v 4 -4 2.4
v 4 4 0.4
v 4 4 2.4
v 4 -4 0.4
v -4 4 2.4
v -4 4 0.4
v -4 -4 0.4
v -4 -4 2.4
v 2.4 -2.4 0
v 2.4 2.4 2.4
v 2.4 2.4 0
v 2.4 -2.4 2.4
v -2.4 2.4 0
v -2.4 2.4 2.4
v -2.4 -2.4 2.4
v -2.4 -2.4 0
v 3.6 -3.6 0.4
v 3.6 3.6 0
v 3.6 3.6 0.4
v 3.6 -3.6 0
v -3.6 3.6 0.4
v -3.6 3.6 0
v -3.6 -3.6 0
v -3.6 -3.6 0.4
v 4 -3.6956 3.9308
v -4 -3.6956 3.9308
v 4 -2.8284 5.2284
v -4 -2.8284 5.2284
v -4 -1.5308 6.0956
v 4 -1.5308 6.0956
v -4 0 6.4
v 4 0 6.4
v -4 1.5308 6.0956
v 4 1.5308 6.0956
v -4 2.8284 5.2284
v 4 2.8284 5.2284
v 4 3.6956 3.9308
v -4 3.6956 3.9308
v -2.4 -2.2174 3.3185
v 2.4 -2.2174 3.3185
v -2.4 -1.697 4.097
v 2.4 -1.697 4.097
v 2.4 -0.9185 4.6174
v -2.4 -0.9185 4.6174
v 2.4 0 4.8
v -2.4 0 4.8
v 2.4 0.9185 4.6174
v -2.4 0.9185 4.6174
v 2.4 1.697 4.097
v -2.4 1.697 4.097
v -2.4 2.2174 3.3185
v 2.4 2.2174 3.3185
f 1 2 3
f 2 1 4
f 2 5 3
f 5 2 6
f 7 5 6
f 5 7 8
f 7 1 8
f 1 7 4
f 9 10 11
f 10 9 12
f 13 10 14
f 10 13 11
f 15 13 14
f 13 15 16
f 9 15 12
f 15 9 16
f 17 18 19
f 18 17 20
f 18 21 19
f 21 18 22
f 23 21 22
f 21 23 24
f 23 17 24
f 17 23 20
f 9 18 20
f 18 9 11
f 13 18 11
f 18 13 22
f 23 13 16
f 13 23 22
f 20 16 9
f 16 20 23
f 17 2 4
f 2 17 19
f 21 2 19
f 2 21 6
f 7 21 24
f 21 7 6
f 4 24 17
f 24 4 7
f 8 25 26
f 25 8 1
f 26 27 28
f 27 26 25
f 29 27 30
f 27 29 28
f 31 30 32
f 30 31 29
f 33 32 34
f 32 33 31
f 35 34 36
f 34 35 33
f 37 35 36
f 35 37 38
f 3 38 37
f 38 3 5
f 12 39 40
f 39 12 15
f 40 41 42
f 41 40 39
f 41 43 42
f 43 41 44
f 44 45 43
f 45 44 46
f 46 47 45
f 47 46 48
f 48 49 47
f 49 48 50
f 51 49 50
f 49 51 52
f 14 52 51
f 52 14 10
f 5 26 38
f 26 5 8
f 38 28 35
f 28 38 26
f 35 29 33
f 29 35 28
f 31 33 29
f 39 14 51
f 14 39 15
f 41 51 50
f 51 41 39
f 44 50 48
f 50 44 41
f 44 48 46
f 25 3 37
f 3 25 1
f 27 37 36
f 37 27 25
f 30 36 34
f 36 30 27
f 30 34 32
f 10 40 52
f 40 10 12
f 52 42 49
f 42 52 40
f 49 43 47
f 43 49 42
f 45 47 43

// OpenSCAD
// file: ../p/2-4edge.scad
use <../lib.scad>
function ldraw_lib__2_4edge() = [
// 0 Circle 0.5
// 0 Name: 2-4edge.dat
// 0 Author: James Jessiman
// 0 !LDRAW_ORG Primitive UPDATE 2017-01
// 0 !LICENSE Licensed under CC BY 2.0 and CC BY 4.0 : see CAreadme.txt
// 
// 0 BFC CERTIFY CCW
  [0,"BFC","CERTIFY"],
  [0,"BFC","CCW"],
// 
// 0 !HISTORY 2007-06-24 [PTadmin] Header formatted for Contributor Agreement
// 0 !HISTORY 2008-07-01 [PTadmin] Official Update 2008-01
// 0 !HISTORY 2017-01-15 [Steffen] BFCed
// 0 !HISTORY 2017-12-30 [PTadmin] Official Update 2017-01
// 
// 
// 2 24 1 0 0 0.9239 0 0.3827
  [2,24,1,0,0,0.9239,0,0.3827],
// 2 24 0.9239 0 0.3827 0.7071 0 0.7071
  [2,24,0.9239,0,0.3827,0.7071,0,0.7071],
// 2 24 0.7071 0 0.7071 0.3827 0 0.9239
  [2,24,0.7071,0,0.7071,0.3827,0,0.9239],
// 2 24 0.3827 0 0.9239 0 0 1
  [2,24,0.3827,0,0.9239,0,0,1],
// 2 24 0 0 1 -0.3827 0 0.9239
  [2,24,0,0,1,-0.3827,0,0.9239],
// 2 24 -0.3827 0 0.9239 -0.7071 0 0.7071
  [2,24,-0.3827,0,0.9239,-0.7071,0,0.7071],
// 2 24 -0.7071 0 0.7071 -0.9239 0 0.3827
  [2,24,-0.7071,0,0.7071,-0.9239,0,0.3827],
// 2 24 -0.9239 0 0.3827 -1 0 0
  [2,24,-0.9239,0,0.3827,-1,0,0],
];
makepoly(ldraw_lib__2_4edge(), line=0.2);
// file: ../p/2-4cyli.scad
use <../lib.scad>
function ldraw_lib__2_4cyli() = [
// 0 Cylinder 0.5
// 0 Name: 2-4cyli.dat
// 0 Author: James Jessiman
// 0 !LDRAW_ORG Primitive UPDATE 2005-01
// 0 !LICENSE Licensed under CC BY 2.0 and CC BY 4.0 : see CAreadme.txt
// 
// 0 BFC CERTIFY CCW
  [0,"BFC","CERTIFY"],
  [0,"BFC","CCW"],
// 
// 0 !HISTORY 2002-03-23 [sbliss] Added BFC statement; compacted code
// 0 !HISTORY 2002-04-25 [PTadmin] Official Update 2002-02
// 0 !HISTORY 2004-12-11 [nielsk] Recreated using Primitive Generator, Edge lines fixed, BFC changed to CCW
// 0 !HISTORY 2005-12-28 [PTadmin] Official Update 2005-01
// 0 !HISTORY 2007-06-24 [PTadmin] Header formatted for Contributor Agreement
// 0 !HISTORY 2008-07-01 [PTadmin] Official Update 2008-01
// 
// 
// 4 16 .9239 1 .3827 .9239 0 .3827 1 0 0 1 1 0
  [4,16,.9239,1,.3827,.9239,0,.3827,1,0,0,1,1,0],
// 4 16 .7071 1 .7071 .7071 0 .7071 .9239 0 .3827 .9239 1 .3827
  [4,16,.7071,1,.7071,.7071,0,.7071,.9239,0,.3827,.9239,1,.3827],
// 4 16 .3827 1 .9239 .3827 0 .9239 .7071 0 .7071 .7071 1 .7071
  [4,16,.3827,1,.9239,.3827,0,.9239,.7071,0,.7071,.7071,1,.7071],
// 4 16 0 1 1 0 0 1 .3827 0 .9239 .3827 1 .9239
  [4,16,0,1,1,0,0,1,.3827,0,.9239,.3827,1,.9239],
// 4 16 -.3827 1 .9239 -.3827 0 .9239 0 0 1 0 1 1
  [4,16,-.3827,1,.9239,-.3827,0,.9239,0,0,1,0,1,1],
// 4 16 -.7071 1 .7071 -.7071 0 .7071 -.3827 0 .9239 -.3827 1 .9239
  [4,16,-.7071,1,.7071,-.7071,0,.7071,-.3827,0,.9239,-.3827,1,.9239],
// 4 16 -.9239 1 .3827 -.9239 0 .3827 -.7071 0 .7071 -.7071 1 .7071
  [4,16,-.9239,1,.3827,-.9239,0,.3827,-.7071,0,.7071,-.7071,1,.7071],
// 4 16 -1 1 0 -1 0 0 -.9239 0 .3827 -.9239 1 .3827
  [4,16,-1,1,0,-1,0,0,-.9239,0,.3827,-.9239,1,.3827],
// 5 24 1 1 0 1 0 0 1 1 -.4142 .9239 1 .3827
  [5,24,1,1,0,1,0,0,1,1,-.4142,.9239,1,.3827],
// 5 24 .9239 1 .3827 .9239 0 .3827 1 1 0 .7071 1 .7071
  [5,24,.9239,1,.3827,.9239,0,.3827,1,1,0,.7071,1,.7071],
// 5 24 .7071 1 .7071 .7071 0 .7071 .9239 1 .3827 .3827 1 .9239
  [5,24,.7071,1,.7071,.7071,0,.7071,.9239,1,.3827,.3827,1,.9239],
// 5 24 .3827 1 .9239 .3827 0 .9239 .7071 1 .7071 0 1 1
  [5,24,.3827,1,.9239,.3827,0,.9239,.7071,1,.7071,0,1,1],
// 5 24 0 1 1 0 0 1 .3827 1 .9239 -.3827 1 .9239
  [5,24,0,1,1,0,0,1,.3827,1,.9239,-.3827,1,.9239],
// 5 24 -.3827 1 .9239 -.3827 0 .9239 0 1 1 -.7071 1 .7071
  [5,24,-.3827,1,.9239,-.3827,0,.9239,0,1,1,-.7071,1,.7071],
// 5 24 -.7071 1 .7071 -.7071 0 .7071 -.3827 1 .9239 -.9239 1 .3827
  [5,24,-.7071,1,.7071,-.7071,0,.7071,-.3827,1,.9239,-.9239,1,.3827],
// 5 24 -.9239 1 .3827 -.9239 0 .3827 -.7071 1 .7071 -1 1 0
  [5,24,-.9239,1,.3827,-.9239,0,.3827,-.7071,1,.7071,-1,1,0],
// 5 24 -1 1 0 -1 0 0 -.9239 1 .3827 -1 1 -.4142
  [5,24,-1,1,0,-1,0,0,-.9239,1,.3827,-1,1,-.4142],
// 0
];
makepoly(ldraw_lib__2_4cyli(), line=0.2);
// file: ../p/box4o4a.scad
use <../lib.scad>
function ldraw_lib__box4o4a() = [
// 0 Box with 4 Faces (2 Parallel Pairs) without Bottom Edges
// 0 Name: box4o4a.dat
// 0 Author: Donald Sutter [technog]
// 0 !LDRAW_ORG Primitive UPDATE 2012-01
// 0 !LICENSE Licensed under CC BY 2.0 and CC BY 4.0 : see CAreadme.txt
// 
// 0 BFC CERTIFY CCW
  [0,"BFC","CERTIFY"],
  [0,"BFC","CCW"],
// 
// 0 !HISTORY 2003-08-01 [PTadmin] Official Update 2003-02
// 0 !HISTORY 2007-06-24 [PTadmin] Header formatted for Contributor Agreement
// 0 !HISTORY 2008-07-01 [PTadmin] Official Update 2008-01
// 0 !HISTORY 2012-02-16 [Philo] Changed to CCW
// 0 !HISTORY 2012-03-30 [PTadmin] Official Update 2012-01
// 
// 
// 2 24 1 0 1 -1 0 1
  [2,24,1,0,1,-1,0,1],
// 2 24 -1 0 1 -1 0 -1
  [2,24,-1,0,1,-1,0,-1],
// 2 24 -1 0 -1 1 0 -1
  [2,24,-1,0,-1,1,0,-1],
// 2 24 1 0 -1 1 0 1
  [2,24,1,0,-1,1,0,1],
// 2 24 1 0 1 1 1 1
  [2,24,1,0,1,1,1,1],
// 2 24 -1 0 1 -1 1 1
  [2,24,-1,0,1,-1,1,1],
// 2 24 1 0 -1 1 1 -1
  [2,24,1,0,-1,1,1,-1],
// 2 24 -1 0 -1 -1 1 -1
  [2,24,-1,0,-1,-1,1,-1],
// 4 16 -1 1 1 -1 0 1 1 0 1 1 1 1
  [4,16,-1,1,1,-1,0,1,1,0,1,1,1,1],
// 4 16 -1 1 -1 -1 0 -1 -1 0 1 -1 1 1
  [4,16,-1,1,-1,-1,0,-1,-1,0,1,-1,1,1],
// 4 16 1 1 -1 1 0 -1 -1 0 -1 -1 1 -1
  [4,16,1,1,-1,1,0,-1,-1,0,-1,-1,1,-1],
// 4 16 1 1 1 1 0 1 1 0 -1 1 1 -1
  [4,16,1,1,1,1,0,1,1,0,-1,1,1,-1],
];
makepoly(ldraw_lib__box4o4a(), line=0.2);
// file: ../p/box4.scad
use <../lib.scad>
function ldraw_lib__box4() = [
// 0 Box with 4 Faces (2 Parallel Pairs) and All Edges
// 0 Name: box4.dat
// 0 Author: James Jessiman
// 0 !LDRAW_ORG Primitive UPDATE 2012-01
// 0 !LICENSE Licensed under CC BY 2.0 and CC BY 4.0 : see CAreadme.txt
// 
// 0 BFC CERTIFY CCW
  [0,"BFC","CERTIFY"],
  [0,"BFC","CCW"],
// 
// 0 !HISTORY 2002-04-03 [sbliss] Modified for BFC compliance
// 0 !HISTORY 2002-04-25 [PTadmin] Official Update 2002-02
// 0 !HISTORY 2007-06-24 [PTadmin] Header formatted for Contributor Agreement
// 0 !HISTORY 2008-07-01 [PTadmin] Official Update 2008-01
// 0 !HISTORY 2012-02-16 [Philo] Changed to CCW
// 0 !HISTORY 2012-03-30 [PTadmin] Official Update 2012-01
// 
// 
// 2 24 1 1 1 -1 1 1
  [2,24,1,1,1,-1,1,1],
// 2 24 -1 1 1 -1 1 -1
  [2,24,-1,1,1,-1,1,-1],
// 2 24 -1 1 -1 1 1 -1
  [2,24,-1,1,-1,1,1,-1],
// 2 24 1 1 -1 1 1 1
  [2,24,1,1,-1,1,1,1],
// 2 24 1 0 1 -1 0 1
  [2,24,1,0,1,-1,0,1],
// 2 24 -1 0 1 -1 0 -1
  [2,24,-1,0,1,-1,0,-1],
// 2 24 -1 0 -1 1 0 -1
  [2,24,-1,0,-1,1,0,-1],
// 2 24 1 0 -1 1 0 1
  [2,24,1,0,-1,1,0,1],
// 2 24 1 0 1 1 1 1
  [2,24,1,0,1,1,1,1],
// 2 24 -1 0 1 -1 1 1
  [2,24,-1,0,1,-1,1,1],
// 2 24 1 0 -1 1 1 -1
  [2,24,1,0,-1,1,1,-1],
// 2 24 -1 0 -1 -1 1 -1
  [2,24,-1,0,-1,-1,1,-1],
// 4 16 -1 1 1 -1 0 1 1 0 1 1 1 1
  [4,16,-1,1,1,-1,0,1,1,0,1,1,1,1],
// 4 16 -1 1 -1 -1 0 -1 -1 0 1 -1 1 1
  [4,16,-1,1,-1,-1,0,-1,-1,0,1,-1,1,1],
// 4 16 1 1 -1 1 0 -1 -1 0 -1 -1 1 -1
  [4,16,1,1,-1,1,0,-1,-1,0,-1,-1,1,-1],
// 4 16 1 1 1 1 0 1 1 0 -1 1 1 -1
  [4,16,1,1,1,1,0,1,1,0,-1,1,1,-1],
];
makepoly(ldraw_lib__box4(), line=0.2);
// file: ../p/2-4cylo.scad
use <../lib.scad>
use <2-4cyli.scad>
use <2-4edge.scad>
function ldraw_lib__2_4cylo() = [
// 0 Cylinder Open 0.5
// 0 Name: 2-4cylo.dat
// 0 Author: Max Martin Richter [MMR1988]
// 0 !LDRAW_ORG Primitive UPDATE 2010-03
// 0 !LICENSE Licensed under CC BY 2.0 and CC BY 4.0 : see CAreadme.txt
// 
// 0 BFC CERTIFY CCW
  [0,"BFC","CERTIFY"],
  [0,"BFC","CCW"],
// 
// 0 !HISTORY 2010-12-31 [PTadmin] Official Update 2010-03
// 
// 
// 1 16 0 0 0 1 0 0 0 1 0 0 0 1 2-4edge.dat
  [1,16,0,0,0,1,0,0,0,1,0,0,0,1, ldraw_lib__2_4edge()],
// 1 16 0 1 0 1 0 0 0 1 0 0 0 1 2-4edge.dat
  [1,16,0,1,0,1,0,0,0,1,0,0,0,1, ldraw_lib__2_4edge()],
// 1 16 0 0 0 1 0 0 0 1 0 0 0 1 2-4cyli.dat
  [1,16,0,0,0,1,0,0,0,1,0,0,0,1, ldraw_lib__2_4cyli()],
];
makepoly(ldraw_lib__2_4cylo(), line=0.2);
// file: ../p/2-4chrd.scad
use <../lib.scad>
function ldraw_lib__2_4chrd() = [
// 0 Chord 0.5
// 0 Name: 2-4chrd.dat
// 0 Author: Philippe Hurbain [Philo]
// 0 !LDRAW_ORG Primitive UPDATE 2014-01
// 0 !LICENSE Licensed under CC BY 2.0 and CC BY 4.0 : see CAreadme.txt
// 
// 0 BFC CERTIFY CCW
  [0,"BFC","CERTIFY"],
  [0,"BFC","CCW"],
// 
// 0 !HISTORY 2014-06-21 [PTadmin] Official Update 2014-01
// 
// 
// 4 16 0.9239 0 0.3827 -0.9239 0 0.3827 -1 0 0 1 0 0
  [4,16,0.9239,0,0.3827,-0.9239,0,0.3827,-1,0,0,1,0,0],
// 4 16 0.7071 0 0.7071 -0.7071 0 0.7071 -0.9239 0 0.3827 0.9239 0 0.3827
  [4,16,0.7071,0,0.7071,-0.7071,0,0.7071,-0.9239,0,0.3827,0.9239,0,0.3827],
// 4 16 0.3827 0 0.9239 -0.3827 0 0.9239 -0.7071 0 0.7071 0.7071 0 0.7071
  [4,16,0.3827,0,0.9239,-0.3827,0,0.9239,-0.7071,0,0.7071,0.7071,0,0.7071],
// 3 16 0 0 1 -0.3827 0 0.9239 0.3827 0 0.9239
  [3,16,0,0,1,-0.3827,0,0.9239,0.3827,0,0.9239],
];
makepoly(ldraw_lib__2_4chrd(), line=0.2);
// main file
use <../lib.scad>
use <../p/2-4chrd.scad>
use <../p/2-4cylo.scad>
use <../p/box4.scad>
use <../p/box4o4a.scad>
function ldraw_lib__49307() = [
// 0 Brick  1 x  1 x  0.667 with Curved Top
// 0 Name: 49307.dat
// 0 Author: Philippe Hurbain [Philo]
// 0 !LDRAW_ORG Part UPDATE 2019-01
// 0 !LICENSE Licensed under CC BY 2.0 and CC BY 4.0 : see CAreadme.txt
// 
// 0 BFC CERTIFY CCW
  [0,"BFC","CERTIFY"],
  [0,"BFC","CCW"],
// 
// 0 !HISTORY 2019-06-28 [PTadmin] Official Update 2019-01
// 
// 
// 1 16 0 -1 0 0 0 10 0 -5 0 -10 0 0 box4o4a.dat
  [1,16,0,-1,0,0,0,10,0,-5,0,-10,0,0, ldraw_lib__box4o4a()],
// 0 BFC INVERTNEXT
  [0,"BFC","INVERTNEXT"],
// 1 16 0 0 0 0 0 6 0 -6 0 -6 0 0 box4o4a.dat
  [1,16,0,0,0,0,0,6,0,-6,0,-6,0,0, ldraw_lib__box4o4a()],
// 1 16 0 -1 0 0 0 9 0 1 0 -9 0 0 box4.dat
  [1,16,0,-1,0,0,0,9,0,1,0,-9,0,0, ldraw_lib__box4()],
// 4 16 9 0 -9 6 0 -6 6 0 6 9 0 9
  [4,16,9,0,-9,6,0,-6,6,0,6,9,0,9],
// 4 16 9 0 9 6 0 6 -6 0 6 -9 0 9
  [4,16,9,0,9,6,0,6,-6,0,6,-9,0,9],
// 4 16 -9 0 9 -6 0 6 -6 0 -6 -9 0 -9
  [4,16,-9,0,9,-6,0,6,-6,0,-6,-9,0,-9],
// 4 16 -9 0 -9 -6 0 -6 6 0 -6 9 0 -9
  [4,16,-9,0,-9,-6,0,-6,6,0,-6,9,0,-9],
// 4 16 10 -1 -10 9 -1 -9 9 -1 9 10 -1 10
  [4,16,10,-1,-10,9,-1,-9,9,-1,9,10,-1,10],
// 4 16 10 -1 10 9 -1 9 -9 -1 9 -10 -1 10
  [4,16,10,-1,10,9,-1,9,-9,-1,9,-10,-1,10],
// 4 16 -10 -1 10 -9 -1 9 -9 -1 -9 -10 -1 -10
  [4,16,-10,-1,10,-9,-1,9,-9,-1,-9,-10,-1,-10],
// 4 16 -10 -1 -10 -9 -1 -9 9 -1 -9 10 -1 -10
  [4,16,-10,-1,-10,-9,-1,-9,9,-1,-9,10,-1,-10],
// 1 16 -10 -6 0 0 20 0 0 0 -10 -10 0 0 2-4cylo.dat
  [1,16,-10,-6,0,0,20,0,0,0,-10,-10,0,0, ldraw_lib__2_4cylo()],
// 0 BFC INVERTNEXT
  [0,"BFC","INVERTNEXT"],
// 1 16 -6 -6 0 0 12 0 0 0 -6 -6 0 0 2-4cylo.dat
  [1,16,-6,-6,0,0,12,0,0,0,-6,-6,0,0, ldraw_lib__2_4cylo()],
// 1 16 -10 -6 0 0 20 0 0 0 -10 -10 0 0 2-4chrd.dat
  [1,16,-10,-6,0,0,20,0,0,0,-10,-10,0,0, ldraw_lib__2_4chrd()],
// 1 16 -6 -6 0 0 -12 0 0 0 -6 -6 0 0 2-4chrd.dat
  [1,16,-6,-6,0,0,-12,0,0,0,-6,-6,0,0, ldraw_lib__2_4chrd()],
// 1 16 10 -6 0 0 -20 0 0 0 -10 -10 0 0 2-4chrd.dat
  [1,16,10,-6,0,0,-20,0,0,0,-10,-10,0,0, ldraw_lib__2_4chrd()],
// 1 16 6 -6 0 0 12 0 0 0 -6 -6 0 0 2-4chrd.dat
  [1,16,6,-6,0,0,12,0,0,0,-6,-6,0,0, ldraw_lib__2_4chrd()],
];
makepoly(ldraw_lib__49307(), line=0.2);
